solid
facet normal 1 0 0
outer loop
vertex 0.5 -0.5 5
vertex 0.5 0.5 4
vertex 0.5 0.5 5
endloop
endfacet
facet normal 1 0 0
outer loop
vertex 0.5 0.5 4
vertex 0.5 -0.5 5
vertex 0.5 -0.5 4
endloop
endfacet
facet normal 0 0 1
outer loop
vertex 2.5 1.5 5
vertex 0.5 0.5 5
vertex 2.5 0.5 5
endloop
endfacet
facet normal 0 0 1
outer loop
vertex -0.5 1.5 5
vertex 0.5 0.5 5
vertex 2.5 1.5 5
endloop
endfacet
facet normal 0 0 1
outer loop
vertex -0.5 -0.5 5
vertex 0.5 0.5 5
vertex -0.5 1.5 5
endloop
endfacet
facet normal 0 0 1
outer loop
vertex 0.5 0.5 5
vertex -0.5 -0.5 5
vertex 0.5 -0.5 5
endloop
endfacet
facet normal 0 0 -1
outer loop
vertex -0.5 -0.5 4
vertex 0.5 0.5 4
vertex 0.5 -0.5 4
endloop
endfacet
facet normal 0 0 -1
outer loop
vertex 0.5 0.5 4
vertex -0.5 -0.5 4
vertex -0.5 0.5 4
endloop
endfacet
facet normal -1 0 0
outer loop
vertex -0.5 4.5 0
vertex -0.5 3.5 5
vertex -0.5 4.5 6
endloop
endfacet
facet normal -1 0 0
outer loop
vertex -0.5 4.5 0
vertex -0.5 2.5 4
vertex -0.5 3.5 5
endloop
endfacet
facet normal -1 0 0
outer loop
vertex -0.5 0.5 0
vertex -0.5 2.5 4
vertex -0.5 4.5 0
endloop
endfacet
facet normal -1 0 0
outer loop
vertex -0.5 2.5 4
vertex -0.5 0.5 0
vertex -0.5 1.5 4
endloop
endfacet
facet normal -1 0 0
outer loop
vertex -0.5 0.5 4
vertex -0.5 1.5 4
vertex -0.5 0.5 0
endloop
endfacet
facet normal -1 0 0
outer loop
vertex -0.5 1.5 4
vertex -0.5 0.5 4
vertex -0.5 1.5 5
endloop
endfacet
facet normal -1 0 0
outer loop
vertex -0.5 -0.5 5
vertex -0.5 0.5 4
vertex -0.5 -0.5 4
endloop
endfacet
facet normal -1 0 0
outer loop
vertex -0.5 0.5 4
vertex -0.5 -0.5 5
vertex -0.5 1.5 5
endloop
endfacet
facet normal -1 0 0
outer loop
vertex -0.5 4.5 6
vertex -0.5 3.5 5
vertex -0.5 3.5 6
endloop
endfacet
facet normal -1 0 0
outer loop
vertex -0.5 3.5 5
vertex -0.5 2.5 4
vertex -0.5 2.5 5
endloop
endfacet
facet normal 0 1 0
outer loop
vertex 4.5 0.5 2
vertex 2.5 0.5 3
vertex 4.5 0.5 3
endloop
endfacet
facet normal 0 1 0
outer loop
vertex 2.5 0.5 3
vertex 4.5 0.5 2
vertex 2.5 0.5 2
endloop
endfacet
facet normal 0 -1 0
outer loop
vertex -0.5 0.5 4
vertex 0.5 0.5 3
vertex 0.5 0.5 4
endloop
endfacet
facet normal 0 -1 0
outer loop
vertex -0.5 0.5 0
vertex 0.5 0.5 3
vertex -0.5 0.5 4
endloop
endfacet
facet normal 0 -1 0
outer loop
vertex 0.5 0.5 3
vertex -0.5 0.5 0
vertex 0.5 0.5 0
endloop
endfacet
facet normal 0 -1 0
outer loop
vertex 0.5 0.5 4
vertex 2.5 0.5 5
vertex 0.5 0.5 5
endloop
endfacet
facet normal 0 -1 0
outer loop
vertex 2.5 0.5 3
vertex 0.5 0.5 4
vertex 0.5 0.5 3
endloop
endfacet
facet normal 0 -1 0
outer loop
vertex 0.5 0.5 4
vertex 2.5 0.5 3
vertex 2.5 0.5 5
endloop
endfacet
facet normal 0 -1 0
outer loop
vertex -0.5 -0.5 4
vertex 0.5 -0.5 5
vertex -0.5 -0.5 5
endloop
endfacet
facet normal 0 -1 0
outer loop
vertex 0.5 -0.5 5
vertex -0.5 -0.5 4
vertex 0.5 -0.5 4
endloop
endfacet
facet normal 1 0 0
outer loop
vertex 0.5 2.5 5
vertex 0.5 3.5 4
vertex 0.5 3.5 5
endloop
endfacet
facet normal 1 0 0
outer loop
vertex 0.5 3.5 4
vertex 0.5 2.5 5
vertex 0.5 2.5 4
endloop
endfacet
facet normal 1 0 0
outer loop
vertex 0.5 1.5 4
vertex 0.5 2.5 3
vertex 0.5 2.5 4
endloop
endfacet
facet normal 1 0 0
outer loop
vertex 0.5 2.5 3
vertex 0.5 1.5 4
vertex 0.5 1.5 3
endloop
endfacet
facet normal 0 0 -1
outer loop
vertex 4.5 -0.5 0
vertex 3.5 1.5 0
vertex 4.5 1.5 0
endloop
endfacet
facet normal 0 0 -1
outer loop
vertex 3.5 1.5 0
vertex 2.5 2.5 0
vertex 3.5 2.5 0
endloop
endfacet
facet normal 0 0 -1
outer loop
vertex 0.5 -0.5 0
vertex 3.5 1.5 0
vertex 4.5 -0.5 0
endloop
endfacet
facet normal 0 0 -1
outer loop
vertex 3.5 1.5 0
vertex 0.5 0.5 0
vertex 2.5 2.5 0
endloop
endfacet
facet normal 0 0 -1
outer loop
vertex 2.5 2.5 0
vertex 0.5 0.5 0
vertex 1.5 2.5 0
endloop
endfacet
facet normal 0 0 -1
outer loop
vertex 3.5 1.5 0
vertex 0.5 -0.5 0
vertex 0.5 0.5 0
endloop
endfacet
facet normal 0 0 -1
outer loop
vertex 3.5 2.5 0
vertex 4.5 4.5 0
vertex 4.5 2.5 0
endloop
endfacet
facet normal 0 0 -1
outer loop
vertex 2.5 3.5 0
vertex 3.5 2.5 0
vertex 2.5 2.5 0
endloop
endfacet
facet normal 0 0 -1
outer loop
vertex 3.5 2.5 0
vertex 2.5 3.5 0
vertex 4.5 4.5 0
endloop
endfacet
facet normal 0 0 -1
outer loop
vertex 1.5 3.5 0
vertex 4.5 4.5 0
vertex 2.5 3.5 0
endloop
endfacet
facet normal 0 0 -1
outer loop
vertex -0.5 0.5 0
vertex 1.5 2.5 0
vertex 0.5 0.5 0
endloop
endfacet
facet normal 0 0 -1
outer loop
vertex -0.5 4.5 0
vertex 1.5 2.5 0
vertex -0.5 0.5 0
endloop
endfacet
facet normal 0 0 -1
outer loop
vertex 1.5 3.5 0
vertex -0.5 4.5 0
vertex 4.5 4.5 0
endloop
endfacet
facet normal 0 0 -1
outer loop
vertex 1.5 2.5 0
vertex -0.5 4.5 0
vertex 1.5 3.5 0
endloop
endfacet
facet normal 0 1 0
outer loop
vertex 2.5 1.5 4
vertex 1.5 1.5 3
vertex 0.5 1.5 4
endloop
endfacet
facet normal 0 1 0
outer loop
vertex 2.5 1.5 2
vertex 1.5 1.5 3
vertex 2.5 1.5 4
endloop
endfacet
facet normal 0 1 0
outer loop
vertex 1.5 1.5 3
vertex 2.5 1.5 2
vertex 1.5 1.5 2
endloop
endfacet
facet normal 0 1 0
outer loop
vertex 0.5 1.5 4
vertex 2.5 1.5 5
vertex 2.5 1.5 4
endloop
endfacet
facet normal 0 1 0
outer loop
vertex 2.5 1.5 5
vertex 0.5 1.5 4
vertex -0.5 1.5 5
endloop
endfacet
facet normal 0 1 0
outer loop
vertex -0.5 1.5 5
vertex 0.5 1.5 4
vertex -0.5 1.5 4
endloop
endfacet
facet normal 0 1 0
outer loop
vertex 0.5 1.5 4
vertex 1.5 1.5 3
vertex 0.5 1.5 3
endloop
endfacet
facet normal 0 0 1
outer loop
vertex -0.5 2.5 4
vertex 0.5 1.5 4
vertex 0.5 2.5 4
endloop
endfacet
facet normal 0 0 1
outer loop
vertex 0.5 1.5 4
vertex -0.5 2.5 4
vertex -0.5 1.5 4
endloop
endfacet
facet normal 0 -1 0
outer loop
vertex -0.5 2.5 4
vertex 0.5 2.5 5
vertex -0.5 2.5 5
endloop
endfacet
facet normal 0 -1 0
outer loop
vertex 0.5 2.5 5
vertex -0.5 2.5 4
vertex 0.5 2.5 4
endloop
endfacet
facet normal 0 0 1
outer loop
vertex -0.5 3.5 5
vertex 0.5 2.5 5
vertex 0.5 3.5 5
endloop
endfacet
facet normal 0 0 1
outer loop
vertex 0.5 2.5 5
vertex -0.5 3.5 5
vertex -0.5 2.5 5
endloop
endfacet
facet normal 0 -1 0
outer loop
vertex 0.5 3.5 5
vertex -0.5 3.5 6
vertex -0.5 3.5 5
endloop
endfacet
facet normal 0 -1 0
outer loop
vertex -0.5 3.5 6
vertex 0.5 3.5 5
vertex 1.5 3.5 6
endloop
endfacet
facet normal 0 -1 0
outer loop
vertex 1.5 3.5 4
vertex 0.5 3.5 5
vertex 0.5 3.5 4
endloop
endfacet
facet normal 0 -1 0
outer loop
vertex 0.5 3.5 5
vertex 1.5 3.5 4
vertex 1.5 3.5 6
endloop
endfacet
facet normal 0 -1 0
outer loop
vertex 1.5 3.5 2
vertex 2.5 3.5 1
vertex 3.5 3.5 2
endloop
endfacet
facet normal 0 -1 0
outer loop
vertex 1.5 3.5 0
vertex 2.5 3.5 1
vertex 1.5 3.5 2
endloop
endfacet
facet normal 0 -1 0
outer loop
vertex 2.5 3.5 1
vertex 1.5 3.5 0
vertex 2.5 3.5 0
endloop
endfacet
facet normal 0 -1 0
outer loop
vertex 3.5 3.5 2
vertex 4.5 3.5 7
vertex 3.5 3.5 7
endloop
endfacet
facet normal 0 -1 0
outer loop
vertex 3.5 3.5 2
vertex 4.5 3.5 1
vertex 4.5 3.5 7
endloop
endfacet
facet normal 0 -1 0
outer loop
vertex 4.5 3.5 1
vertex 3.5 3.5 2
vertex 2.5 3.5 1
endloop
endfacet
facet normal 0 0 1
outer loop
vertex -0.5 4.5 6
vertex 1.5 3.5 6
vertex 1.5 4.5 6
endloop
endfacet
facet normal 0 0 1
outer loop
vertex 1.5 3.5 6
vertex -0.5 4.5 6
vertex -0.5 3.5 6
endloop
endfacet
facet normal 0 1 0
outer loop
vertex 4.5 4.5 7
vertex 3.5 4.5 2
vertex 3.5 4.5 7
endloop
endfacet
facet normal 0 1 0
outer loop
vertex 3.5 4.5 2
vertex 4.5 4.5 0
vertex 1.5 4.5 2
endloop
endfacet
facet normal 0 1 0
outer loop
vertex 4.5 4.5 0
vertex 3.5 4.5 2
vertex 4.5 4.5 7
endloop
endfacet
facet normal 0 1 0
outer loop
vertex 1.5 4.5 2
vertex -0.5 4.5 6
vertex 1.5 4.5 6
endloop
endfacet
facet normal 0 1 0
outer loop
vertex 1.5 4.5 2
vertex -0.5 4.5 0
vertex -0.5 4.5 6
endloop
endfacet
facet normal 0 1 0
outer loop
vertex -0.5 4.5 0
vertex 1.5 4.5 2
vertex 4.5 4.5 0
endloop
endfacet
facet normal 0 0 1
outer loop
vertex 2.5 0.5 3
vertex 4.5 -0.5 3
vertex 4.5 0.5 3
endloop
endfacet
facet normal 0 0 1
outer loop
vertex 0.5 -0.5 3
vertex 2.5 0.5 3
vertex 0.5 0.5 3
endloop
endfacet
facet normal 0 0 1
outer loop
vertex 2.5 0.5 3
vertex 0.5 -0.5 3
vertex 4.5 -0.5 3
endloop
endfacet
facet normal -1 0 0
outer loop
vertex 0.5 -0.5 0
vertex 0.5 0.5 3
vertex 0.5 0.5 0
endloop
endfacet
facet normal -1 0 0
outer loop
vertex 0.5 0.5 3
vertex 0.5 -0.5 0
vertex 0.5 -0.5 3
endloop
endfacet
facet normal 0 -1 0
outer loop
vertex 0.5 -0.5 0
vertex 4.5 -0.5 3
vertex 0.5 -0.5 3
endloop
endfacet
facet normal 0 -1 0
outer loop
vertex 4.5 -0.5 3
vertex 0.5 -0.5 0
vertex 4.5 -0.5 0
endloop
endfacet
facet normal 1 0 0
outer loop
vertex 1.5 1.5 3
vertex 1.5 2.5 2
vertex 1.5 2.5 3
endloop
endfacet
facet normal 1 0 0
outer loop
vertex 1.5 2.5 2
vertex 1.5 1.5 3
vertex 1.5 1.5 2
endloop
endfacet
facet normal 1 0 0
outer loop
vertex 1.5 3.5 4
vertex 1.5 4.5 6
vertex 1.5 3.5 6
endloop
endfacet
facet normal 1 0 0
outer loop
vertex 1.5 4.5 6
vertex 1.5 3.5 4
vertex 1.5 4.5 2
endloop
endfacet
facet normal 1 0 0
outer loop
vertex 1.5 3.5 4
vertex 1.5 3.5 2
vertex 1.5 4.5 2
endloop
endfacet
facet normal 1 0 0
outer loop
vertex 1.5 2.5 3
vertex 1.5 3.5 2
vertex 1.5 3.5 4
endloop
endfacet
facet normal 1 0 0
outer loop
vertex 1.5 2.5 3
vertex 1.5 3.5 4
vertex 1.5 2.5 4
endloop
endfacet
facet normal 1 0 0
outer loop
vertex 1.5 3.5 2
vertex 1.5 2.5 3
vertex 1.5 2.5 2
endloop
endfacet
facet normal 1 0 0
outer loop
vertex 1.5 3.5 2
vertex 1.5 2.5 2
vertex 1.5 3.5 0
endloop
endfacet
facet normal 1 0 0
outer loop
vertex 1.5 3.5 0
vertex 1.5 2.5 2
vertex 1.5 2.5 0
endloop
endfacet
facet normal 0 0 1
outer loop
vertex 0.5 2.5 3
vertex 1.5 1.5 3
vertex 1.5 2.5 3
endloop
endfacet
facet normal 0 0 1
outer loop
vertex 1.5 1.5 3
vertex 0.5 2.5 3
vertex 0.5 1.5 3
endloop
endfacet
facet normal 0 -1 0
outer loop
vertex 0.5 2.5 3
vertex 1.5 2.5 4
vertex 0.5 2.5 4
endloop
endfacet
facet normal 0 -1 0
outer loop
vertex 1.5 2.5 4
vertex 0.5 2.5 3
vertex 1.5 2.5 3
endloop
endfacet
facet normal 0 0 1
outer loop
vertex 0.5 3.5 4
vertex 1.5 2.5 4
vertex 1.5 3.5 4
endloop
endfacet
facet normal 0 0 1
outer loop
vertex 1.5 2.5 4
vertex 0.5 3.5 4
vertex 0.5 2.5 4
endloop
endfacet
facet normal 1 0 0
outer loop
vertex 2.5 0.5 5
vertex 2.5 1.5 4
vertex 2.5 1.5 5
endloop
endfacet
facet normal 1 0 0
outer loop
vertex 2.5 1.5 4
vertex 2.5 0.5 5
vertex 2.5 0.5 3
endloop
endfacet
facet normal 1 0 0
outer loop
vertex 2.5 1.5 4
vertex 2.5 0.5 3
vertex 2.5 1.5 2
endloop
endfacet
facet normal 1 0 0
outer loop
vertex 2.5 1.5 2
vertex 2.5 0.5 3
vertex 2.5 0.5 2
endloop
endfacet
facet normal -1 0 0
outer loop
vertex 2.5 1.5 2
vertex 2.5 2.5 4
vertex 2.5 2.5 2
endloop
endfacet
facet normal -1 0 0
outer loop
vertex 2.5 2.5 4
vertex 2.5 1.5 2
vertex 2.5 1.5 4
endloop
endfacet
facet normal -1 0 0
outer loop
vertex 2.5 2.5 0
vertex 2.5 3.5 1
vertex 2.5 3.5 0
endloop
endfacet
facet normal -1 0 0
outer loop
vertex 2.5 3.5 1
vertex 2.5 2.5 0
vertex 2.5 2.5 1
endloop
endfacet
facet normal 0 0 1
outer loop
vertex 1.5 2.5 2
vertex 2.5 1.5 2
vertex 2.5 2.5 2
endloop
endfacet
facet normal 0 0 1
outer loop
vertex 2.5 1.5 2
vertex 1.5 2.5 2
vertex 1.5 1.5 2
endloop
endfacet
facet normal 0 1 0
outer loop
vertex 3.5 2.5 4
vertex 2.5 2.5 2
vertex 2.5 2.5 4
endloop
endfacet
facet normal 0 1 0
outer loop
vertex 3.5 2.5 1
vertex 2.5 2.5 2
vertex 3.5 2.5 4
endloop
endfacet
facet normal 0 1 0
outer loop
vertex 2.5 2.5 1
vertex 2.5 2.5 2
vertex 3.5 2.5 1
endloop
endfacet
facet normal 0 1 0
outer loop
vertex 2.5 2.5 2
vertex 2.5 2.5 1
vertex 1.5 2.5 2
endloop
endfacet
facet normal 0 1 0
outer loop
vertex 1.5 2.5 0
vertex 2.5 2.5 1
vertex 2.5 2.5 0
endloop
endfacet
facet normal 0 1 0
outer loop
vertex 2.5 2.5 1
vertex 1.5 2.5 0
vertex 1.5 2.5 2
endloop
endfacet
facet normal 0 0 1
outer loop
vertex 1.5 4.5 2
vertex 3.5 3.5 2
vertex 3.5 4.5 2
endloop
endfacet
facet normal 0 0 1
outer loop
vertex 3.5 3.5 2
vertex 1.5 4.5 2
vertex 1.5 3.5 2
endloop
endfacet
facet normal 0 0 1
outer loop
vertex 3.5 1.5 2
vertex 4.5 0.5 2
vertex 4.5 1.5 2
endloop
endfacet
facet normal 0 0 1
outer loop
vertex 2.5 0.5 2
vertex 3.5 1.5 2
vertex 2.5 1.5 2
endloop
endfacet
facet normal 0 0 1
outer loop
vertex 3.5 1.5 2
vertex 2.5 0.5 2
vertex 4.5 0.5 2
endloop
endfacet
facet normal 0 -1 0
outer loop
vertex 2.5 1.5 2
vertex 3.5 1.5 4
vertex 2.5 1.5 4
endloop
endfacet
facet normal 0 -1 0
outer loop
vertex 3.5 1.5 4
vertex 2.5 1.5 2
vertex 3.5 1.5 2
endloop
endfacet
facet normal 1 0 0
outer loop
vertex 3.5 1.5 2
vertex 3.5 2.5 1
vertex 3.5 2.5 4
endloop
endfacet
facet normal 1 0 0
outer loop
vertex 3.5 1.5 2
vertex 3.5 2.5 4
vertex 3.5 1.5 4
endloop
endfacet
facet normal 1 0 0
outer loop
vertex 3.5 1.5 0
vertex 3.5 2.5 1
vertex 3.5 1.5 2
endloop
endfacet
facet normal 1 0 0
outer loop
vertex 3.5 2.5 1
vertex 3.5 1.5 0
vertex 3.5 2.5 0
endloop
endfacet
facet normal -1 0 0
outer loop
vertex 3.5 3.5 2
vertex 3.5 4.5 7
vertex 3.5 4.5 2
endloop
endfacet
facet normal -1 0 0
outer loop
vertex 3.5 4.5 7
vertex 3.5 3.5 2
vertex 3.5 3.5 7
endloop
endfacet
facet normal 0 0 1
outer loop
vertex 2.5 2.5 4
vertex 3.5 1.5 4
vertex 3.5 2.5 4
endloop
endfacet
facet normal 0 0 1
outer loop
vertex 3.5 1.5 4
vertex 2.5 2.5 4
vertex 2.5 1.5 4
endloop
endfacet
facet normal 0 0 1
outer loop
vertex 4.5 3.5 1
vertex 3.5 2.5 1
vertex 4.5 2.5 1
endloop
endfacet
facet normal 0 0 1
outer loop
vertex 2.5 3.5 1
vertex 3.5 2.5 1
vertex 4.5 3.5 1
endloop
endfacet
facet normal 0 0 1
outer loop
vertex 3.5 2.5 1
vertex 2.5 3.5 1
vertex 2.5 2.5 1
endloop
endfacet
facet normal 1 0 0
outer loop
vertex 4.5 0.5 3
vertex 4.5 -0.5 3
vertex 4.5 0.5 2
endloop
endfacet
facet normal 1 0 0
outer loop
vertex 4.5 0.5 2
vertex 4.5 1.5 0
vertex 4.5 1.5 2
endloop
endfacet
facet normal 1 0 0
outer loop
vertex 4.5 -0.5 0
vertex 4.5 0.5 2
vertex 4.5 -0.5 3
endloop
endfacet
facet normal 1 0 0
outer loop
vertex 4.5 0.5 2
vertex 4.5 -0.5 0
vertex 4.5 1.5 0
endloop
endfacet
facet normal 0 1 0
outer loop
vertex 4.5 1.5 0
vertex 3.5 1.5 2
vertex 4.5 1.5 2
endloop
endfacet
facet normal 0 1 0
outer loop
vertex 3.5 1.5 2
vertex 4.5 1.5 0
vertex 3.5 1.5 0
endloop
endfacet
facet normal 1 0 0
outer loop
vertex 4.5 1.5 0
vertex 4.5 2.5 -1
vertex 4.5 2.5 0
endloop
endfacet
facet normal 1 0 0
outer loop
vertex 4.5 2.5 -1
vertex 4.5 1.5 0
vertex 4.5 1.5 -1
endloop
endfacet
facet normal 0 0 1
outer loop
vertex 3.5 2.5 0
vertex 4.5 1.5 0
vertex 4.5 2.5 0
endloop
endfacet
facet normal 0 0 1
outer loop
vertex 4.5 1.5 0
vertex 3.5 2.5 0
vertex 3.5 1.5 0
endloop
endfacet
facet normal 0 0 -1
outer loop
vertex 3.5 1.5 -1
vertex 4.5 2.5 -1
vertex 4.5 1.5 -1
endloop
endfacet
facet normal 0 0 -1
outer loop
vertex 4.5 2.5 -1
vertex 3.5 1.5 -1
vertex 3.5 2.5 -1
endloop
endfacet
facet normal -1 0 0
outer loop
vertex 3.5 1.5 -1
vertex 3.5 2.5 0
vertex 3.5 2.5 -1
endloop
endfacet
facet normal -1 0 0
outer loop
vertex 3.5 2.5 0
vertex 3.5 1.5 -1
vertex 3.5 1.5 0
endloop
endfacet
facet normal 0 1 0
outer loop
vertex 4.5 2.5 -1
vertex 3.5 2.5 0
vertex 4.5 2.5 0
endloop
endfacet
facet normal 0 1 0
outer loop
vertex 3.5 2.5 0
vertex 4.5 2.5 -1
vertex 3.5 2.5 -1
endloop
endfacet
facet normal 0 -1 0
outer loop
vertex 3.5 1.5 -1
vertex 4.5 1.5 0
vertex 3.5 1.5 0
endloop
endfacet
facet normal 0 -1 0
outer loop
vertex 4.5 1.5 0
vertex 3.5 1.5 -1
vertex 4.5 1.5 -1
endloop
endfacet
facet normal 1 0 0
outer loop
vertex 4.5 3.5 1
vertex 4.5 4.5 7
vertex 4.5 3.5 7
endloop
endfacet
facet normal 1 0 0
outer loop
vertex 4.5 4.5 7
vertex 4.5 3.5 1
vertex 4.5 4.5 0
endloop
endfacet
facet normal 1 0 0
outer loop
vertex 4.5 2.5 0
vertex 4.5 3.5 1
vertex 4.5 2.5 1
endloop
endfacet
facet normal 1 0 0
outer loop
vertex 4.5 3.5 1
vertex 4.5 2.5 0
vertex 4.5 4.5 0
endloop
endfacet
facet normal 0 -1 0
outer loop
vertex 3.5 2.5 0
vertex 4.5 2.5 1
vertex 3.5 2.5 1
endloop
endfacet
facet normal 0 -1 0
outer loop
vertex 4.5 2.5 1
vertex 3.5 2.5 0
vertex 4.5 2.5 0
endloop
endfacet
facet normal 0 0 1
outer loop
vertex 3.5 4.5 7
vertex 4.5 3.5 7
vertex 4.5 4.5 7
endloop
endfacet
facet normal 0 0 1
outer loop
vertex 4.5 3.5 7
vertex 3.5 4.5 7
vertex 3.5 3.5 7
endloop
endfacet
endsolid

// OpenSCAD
union() {
    translate([0, 0, 4.5]) color([1, 0, 0]) cube([1, 1, 1], center=true);
    translate([0, 1, 2.5]) cube([1, 1, 5], center=true);
    translate([0, 2, 2.0]) cube([1, 1, 4], center=true);
    translate([0, 3, 2.5]) cube([1, 1, 5], center=true);
    translate([0, 4, 3.0]) cube([1, 1, 6], center=true);
    translate([1, 0, 1.5]) cube([1, 1, 3], center=true);
    translate([1, 1, 2.5]) cube([1, 1, 5], center=true);
    translate([1, 2, 1.5]) cube([1, 1, 3], center=true);
    translate([1, 3, 2.0]) cube([1, 1, 4], center=true);
    translate([1, 4, 3.0]) cube([1, 1, 6], center=true);
    translate([2, 0, 1.5]) cube([1, 1, 3], center=true);
    translate([2, 1, 2.5]) cube([1, 1, 5], center=true);
    translate([2, 2, 1.0]) cube([1, 1, 2], center=true);
    translate([2, 4, 1.0]) cube([1, 1, 2], center=true);
    translate([3, 0, 1.5]) cube([1, 1, 3], center=true);
    translate([3, 1, 1.0]) cube([1, 1, 2], center=true);
    translate([3, 2, 2.0]) cube([1, 1, 4], center=true);
    translate([3, 3, 0.5]) cube([1, 1, 1], center=true);
    translate([3, 4, 1.0]) cube([1, 1, 2], center=true);
    translate([4, 0, 1.5]) cube([1, 1, 3], center=true);
    translate([4, 1, 1.0]) cube([1, 1, 2], center=true);
    translate([4, 2, -0.5]) color([0, 0, 1]) cube([1, 1, 1], center=true);
    translate([4, 3, 0.5]) cube([1, 1, 1], center=true);
    translate([4, 4, 3.5]) cube([1, 1, 7], center=true);
}
